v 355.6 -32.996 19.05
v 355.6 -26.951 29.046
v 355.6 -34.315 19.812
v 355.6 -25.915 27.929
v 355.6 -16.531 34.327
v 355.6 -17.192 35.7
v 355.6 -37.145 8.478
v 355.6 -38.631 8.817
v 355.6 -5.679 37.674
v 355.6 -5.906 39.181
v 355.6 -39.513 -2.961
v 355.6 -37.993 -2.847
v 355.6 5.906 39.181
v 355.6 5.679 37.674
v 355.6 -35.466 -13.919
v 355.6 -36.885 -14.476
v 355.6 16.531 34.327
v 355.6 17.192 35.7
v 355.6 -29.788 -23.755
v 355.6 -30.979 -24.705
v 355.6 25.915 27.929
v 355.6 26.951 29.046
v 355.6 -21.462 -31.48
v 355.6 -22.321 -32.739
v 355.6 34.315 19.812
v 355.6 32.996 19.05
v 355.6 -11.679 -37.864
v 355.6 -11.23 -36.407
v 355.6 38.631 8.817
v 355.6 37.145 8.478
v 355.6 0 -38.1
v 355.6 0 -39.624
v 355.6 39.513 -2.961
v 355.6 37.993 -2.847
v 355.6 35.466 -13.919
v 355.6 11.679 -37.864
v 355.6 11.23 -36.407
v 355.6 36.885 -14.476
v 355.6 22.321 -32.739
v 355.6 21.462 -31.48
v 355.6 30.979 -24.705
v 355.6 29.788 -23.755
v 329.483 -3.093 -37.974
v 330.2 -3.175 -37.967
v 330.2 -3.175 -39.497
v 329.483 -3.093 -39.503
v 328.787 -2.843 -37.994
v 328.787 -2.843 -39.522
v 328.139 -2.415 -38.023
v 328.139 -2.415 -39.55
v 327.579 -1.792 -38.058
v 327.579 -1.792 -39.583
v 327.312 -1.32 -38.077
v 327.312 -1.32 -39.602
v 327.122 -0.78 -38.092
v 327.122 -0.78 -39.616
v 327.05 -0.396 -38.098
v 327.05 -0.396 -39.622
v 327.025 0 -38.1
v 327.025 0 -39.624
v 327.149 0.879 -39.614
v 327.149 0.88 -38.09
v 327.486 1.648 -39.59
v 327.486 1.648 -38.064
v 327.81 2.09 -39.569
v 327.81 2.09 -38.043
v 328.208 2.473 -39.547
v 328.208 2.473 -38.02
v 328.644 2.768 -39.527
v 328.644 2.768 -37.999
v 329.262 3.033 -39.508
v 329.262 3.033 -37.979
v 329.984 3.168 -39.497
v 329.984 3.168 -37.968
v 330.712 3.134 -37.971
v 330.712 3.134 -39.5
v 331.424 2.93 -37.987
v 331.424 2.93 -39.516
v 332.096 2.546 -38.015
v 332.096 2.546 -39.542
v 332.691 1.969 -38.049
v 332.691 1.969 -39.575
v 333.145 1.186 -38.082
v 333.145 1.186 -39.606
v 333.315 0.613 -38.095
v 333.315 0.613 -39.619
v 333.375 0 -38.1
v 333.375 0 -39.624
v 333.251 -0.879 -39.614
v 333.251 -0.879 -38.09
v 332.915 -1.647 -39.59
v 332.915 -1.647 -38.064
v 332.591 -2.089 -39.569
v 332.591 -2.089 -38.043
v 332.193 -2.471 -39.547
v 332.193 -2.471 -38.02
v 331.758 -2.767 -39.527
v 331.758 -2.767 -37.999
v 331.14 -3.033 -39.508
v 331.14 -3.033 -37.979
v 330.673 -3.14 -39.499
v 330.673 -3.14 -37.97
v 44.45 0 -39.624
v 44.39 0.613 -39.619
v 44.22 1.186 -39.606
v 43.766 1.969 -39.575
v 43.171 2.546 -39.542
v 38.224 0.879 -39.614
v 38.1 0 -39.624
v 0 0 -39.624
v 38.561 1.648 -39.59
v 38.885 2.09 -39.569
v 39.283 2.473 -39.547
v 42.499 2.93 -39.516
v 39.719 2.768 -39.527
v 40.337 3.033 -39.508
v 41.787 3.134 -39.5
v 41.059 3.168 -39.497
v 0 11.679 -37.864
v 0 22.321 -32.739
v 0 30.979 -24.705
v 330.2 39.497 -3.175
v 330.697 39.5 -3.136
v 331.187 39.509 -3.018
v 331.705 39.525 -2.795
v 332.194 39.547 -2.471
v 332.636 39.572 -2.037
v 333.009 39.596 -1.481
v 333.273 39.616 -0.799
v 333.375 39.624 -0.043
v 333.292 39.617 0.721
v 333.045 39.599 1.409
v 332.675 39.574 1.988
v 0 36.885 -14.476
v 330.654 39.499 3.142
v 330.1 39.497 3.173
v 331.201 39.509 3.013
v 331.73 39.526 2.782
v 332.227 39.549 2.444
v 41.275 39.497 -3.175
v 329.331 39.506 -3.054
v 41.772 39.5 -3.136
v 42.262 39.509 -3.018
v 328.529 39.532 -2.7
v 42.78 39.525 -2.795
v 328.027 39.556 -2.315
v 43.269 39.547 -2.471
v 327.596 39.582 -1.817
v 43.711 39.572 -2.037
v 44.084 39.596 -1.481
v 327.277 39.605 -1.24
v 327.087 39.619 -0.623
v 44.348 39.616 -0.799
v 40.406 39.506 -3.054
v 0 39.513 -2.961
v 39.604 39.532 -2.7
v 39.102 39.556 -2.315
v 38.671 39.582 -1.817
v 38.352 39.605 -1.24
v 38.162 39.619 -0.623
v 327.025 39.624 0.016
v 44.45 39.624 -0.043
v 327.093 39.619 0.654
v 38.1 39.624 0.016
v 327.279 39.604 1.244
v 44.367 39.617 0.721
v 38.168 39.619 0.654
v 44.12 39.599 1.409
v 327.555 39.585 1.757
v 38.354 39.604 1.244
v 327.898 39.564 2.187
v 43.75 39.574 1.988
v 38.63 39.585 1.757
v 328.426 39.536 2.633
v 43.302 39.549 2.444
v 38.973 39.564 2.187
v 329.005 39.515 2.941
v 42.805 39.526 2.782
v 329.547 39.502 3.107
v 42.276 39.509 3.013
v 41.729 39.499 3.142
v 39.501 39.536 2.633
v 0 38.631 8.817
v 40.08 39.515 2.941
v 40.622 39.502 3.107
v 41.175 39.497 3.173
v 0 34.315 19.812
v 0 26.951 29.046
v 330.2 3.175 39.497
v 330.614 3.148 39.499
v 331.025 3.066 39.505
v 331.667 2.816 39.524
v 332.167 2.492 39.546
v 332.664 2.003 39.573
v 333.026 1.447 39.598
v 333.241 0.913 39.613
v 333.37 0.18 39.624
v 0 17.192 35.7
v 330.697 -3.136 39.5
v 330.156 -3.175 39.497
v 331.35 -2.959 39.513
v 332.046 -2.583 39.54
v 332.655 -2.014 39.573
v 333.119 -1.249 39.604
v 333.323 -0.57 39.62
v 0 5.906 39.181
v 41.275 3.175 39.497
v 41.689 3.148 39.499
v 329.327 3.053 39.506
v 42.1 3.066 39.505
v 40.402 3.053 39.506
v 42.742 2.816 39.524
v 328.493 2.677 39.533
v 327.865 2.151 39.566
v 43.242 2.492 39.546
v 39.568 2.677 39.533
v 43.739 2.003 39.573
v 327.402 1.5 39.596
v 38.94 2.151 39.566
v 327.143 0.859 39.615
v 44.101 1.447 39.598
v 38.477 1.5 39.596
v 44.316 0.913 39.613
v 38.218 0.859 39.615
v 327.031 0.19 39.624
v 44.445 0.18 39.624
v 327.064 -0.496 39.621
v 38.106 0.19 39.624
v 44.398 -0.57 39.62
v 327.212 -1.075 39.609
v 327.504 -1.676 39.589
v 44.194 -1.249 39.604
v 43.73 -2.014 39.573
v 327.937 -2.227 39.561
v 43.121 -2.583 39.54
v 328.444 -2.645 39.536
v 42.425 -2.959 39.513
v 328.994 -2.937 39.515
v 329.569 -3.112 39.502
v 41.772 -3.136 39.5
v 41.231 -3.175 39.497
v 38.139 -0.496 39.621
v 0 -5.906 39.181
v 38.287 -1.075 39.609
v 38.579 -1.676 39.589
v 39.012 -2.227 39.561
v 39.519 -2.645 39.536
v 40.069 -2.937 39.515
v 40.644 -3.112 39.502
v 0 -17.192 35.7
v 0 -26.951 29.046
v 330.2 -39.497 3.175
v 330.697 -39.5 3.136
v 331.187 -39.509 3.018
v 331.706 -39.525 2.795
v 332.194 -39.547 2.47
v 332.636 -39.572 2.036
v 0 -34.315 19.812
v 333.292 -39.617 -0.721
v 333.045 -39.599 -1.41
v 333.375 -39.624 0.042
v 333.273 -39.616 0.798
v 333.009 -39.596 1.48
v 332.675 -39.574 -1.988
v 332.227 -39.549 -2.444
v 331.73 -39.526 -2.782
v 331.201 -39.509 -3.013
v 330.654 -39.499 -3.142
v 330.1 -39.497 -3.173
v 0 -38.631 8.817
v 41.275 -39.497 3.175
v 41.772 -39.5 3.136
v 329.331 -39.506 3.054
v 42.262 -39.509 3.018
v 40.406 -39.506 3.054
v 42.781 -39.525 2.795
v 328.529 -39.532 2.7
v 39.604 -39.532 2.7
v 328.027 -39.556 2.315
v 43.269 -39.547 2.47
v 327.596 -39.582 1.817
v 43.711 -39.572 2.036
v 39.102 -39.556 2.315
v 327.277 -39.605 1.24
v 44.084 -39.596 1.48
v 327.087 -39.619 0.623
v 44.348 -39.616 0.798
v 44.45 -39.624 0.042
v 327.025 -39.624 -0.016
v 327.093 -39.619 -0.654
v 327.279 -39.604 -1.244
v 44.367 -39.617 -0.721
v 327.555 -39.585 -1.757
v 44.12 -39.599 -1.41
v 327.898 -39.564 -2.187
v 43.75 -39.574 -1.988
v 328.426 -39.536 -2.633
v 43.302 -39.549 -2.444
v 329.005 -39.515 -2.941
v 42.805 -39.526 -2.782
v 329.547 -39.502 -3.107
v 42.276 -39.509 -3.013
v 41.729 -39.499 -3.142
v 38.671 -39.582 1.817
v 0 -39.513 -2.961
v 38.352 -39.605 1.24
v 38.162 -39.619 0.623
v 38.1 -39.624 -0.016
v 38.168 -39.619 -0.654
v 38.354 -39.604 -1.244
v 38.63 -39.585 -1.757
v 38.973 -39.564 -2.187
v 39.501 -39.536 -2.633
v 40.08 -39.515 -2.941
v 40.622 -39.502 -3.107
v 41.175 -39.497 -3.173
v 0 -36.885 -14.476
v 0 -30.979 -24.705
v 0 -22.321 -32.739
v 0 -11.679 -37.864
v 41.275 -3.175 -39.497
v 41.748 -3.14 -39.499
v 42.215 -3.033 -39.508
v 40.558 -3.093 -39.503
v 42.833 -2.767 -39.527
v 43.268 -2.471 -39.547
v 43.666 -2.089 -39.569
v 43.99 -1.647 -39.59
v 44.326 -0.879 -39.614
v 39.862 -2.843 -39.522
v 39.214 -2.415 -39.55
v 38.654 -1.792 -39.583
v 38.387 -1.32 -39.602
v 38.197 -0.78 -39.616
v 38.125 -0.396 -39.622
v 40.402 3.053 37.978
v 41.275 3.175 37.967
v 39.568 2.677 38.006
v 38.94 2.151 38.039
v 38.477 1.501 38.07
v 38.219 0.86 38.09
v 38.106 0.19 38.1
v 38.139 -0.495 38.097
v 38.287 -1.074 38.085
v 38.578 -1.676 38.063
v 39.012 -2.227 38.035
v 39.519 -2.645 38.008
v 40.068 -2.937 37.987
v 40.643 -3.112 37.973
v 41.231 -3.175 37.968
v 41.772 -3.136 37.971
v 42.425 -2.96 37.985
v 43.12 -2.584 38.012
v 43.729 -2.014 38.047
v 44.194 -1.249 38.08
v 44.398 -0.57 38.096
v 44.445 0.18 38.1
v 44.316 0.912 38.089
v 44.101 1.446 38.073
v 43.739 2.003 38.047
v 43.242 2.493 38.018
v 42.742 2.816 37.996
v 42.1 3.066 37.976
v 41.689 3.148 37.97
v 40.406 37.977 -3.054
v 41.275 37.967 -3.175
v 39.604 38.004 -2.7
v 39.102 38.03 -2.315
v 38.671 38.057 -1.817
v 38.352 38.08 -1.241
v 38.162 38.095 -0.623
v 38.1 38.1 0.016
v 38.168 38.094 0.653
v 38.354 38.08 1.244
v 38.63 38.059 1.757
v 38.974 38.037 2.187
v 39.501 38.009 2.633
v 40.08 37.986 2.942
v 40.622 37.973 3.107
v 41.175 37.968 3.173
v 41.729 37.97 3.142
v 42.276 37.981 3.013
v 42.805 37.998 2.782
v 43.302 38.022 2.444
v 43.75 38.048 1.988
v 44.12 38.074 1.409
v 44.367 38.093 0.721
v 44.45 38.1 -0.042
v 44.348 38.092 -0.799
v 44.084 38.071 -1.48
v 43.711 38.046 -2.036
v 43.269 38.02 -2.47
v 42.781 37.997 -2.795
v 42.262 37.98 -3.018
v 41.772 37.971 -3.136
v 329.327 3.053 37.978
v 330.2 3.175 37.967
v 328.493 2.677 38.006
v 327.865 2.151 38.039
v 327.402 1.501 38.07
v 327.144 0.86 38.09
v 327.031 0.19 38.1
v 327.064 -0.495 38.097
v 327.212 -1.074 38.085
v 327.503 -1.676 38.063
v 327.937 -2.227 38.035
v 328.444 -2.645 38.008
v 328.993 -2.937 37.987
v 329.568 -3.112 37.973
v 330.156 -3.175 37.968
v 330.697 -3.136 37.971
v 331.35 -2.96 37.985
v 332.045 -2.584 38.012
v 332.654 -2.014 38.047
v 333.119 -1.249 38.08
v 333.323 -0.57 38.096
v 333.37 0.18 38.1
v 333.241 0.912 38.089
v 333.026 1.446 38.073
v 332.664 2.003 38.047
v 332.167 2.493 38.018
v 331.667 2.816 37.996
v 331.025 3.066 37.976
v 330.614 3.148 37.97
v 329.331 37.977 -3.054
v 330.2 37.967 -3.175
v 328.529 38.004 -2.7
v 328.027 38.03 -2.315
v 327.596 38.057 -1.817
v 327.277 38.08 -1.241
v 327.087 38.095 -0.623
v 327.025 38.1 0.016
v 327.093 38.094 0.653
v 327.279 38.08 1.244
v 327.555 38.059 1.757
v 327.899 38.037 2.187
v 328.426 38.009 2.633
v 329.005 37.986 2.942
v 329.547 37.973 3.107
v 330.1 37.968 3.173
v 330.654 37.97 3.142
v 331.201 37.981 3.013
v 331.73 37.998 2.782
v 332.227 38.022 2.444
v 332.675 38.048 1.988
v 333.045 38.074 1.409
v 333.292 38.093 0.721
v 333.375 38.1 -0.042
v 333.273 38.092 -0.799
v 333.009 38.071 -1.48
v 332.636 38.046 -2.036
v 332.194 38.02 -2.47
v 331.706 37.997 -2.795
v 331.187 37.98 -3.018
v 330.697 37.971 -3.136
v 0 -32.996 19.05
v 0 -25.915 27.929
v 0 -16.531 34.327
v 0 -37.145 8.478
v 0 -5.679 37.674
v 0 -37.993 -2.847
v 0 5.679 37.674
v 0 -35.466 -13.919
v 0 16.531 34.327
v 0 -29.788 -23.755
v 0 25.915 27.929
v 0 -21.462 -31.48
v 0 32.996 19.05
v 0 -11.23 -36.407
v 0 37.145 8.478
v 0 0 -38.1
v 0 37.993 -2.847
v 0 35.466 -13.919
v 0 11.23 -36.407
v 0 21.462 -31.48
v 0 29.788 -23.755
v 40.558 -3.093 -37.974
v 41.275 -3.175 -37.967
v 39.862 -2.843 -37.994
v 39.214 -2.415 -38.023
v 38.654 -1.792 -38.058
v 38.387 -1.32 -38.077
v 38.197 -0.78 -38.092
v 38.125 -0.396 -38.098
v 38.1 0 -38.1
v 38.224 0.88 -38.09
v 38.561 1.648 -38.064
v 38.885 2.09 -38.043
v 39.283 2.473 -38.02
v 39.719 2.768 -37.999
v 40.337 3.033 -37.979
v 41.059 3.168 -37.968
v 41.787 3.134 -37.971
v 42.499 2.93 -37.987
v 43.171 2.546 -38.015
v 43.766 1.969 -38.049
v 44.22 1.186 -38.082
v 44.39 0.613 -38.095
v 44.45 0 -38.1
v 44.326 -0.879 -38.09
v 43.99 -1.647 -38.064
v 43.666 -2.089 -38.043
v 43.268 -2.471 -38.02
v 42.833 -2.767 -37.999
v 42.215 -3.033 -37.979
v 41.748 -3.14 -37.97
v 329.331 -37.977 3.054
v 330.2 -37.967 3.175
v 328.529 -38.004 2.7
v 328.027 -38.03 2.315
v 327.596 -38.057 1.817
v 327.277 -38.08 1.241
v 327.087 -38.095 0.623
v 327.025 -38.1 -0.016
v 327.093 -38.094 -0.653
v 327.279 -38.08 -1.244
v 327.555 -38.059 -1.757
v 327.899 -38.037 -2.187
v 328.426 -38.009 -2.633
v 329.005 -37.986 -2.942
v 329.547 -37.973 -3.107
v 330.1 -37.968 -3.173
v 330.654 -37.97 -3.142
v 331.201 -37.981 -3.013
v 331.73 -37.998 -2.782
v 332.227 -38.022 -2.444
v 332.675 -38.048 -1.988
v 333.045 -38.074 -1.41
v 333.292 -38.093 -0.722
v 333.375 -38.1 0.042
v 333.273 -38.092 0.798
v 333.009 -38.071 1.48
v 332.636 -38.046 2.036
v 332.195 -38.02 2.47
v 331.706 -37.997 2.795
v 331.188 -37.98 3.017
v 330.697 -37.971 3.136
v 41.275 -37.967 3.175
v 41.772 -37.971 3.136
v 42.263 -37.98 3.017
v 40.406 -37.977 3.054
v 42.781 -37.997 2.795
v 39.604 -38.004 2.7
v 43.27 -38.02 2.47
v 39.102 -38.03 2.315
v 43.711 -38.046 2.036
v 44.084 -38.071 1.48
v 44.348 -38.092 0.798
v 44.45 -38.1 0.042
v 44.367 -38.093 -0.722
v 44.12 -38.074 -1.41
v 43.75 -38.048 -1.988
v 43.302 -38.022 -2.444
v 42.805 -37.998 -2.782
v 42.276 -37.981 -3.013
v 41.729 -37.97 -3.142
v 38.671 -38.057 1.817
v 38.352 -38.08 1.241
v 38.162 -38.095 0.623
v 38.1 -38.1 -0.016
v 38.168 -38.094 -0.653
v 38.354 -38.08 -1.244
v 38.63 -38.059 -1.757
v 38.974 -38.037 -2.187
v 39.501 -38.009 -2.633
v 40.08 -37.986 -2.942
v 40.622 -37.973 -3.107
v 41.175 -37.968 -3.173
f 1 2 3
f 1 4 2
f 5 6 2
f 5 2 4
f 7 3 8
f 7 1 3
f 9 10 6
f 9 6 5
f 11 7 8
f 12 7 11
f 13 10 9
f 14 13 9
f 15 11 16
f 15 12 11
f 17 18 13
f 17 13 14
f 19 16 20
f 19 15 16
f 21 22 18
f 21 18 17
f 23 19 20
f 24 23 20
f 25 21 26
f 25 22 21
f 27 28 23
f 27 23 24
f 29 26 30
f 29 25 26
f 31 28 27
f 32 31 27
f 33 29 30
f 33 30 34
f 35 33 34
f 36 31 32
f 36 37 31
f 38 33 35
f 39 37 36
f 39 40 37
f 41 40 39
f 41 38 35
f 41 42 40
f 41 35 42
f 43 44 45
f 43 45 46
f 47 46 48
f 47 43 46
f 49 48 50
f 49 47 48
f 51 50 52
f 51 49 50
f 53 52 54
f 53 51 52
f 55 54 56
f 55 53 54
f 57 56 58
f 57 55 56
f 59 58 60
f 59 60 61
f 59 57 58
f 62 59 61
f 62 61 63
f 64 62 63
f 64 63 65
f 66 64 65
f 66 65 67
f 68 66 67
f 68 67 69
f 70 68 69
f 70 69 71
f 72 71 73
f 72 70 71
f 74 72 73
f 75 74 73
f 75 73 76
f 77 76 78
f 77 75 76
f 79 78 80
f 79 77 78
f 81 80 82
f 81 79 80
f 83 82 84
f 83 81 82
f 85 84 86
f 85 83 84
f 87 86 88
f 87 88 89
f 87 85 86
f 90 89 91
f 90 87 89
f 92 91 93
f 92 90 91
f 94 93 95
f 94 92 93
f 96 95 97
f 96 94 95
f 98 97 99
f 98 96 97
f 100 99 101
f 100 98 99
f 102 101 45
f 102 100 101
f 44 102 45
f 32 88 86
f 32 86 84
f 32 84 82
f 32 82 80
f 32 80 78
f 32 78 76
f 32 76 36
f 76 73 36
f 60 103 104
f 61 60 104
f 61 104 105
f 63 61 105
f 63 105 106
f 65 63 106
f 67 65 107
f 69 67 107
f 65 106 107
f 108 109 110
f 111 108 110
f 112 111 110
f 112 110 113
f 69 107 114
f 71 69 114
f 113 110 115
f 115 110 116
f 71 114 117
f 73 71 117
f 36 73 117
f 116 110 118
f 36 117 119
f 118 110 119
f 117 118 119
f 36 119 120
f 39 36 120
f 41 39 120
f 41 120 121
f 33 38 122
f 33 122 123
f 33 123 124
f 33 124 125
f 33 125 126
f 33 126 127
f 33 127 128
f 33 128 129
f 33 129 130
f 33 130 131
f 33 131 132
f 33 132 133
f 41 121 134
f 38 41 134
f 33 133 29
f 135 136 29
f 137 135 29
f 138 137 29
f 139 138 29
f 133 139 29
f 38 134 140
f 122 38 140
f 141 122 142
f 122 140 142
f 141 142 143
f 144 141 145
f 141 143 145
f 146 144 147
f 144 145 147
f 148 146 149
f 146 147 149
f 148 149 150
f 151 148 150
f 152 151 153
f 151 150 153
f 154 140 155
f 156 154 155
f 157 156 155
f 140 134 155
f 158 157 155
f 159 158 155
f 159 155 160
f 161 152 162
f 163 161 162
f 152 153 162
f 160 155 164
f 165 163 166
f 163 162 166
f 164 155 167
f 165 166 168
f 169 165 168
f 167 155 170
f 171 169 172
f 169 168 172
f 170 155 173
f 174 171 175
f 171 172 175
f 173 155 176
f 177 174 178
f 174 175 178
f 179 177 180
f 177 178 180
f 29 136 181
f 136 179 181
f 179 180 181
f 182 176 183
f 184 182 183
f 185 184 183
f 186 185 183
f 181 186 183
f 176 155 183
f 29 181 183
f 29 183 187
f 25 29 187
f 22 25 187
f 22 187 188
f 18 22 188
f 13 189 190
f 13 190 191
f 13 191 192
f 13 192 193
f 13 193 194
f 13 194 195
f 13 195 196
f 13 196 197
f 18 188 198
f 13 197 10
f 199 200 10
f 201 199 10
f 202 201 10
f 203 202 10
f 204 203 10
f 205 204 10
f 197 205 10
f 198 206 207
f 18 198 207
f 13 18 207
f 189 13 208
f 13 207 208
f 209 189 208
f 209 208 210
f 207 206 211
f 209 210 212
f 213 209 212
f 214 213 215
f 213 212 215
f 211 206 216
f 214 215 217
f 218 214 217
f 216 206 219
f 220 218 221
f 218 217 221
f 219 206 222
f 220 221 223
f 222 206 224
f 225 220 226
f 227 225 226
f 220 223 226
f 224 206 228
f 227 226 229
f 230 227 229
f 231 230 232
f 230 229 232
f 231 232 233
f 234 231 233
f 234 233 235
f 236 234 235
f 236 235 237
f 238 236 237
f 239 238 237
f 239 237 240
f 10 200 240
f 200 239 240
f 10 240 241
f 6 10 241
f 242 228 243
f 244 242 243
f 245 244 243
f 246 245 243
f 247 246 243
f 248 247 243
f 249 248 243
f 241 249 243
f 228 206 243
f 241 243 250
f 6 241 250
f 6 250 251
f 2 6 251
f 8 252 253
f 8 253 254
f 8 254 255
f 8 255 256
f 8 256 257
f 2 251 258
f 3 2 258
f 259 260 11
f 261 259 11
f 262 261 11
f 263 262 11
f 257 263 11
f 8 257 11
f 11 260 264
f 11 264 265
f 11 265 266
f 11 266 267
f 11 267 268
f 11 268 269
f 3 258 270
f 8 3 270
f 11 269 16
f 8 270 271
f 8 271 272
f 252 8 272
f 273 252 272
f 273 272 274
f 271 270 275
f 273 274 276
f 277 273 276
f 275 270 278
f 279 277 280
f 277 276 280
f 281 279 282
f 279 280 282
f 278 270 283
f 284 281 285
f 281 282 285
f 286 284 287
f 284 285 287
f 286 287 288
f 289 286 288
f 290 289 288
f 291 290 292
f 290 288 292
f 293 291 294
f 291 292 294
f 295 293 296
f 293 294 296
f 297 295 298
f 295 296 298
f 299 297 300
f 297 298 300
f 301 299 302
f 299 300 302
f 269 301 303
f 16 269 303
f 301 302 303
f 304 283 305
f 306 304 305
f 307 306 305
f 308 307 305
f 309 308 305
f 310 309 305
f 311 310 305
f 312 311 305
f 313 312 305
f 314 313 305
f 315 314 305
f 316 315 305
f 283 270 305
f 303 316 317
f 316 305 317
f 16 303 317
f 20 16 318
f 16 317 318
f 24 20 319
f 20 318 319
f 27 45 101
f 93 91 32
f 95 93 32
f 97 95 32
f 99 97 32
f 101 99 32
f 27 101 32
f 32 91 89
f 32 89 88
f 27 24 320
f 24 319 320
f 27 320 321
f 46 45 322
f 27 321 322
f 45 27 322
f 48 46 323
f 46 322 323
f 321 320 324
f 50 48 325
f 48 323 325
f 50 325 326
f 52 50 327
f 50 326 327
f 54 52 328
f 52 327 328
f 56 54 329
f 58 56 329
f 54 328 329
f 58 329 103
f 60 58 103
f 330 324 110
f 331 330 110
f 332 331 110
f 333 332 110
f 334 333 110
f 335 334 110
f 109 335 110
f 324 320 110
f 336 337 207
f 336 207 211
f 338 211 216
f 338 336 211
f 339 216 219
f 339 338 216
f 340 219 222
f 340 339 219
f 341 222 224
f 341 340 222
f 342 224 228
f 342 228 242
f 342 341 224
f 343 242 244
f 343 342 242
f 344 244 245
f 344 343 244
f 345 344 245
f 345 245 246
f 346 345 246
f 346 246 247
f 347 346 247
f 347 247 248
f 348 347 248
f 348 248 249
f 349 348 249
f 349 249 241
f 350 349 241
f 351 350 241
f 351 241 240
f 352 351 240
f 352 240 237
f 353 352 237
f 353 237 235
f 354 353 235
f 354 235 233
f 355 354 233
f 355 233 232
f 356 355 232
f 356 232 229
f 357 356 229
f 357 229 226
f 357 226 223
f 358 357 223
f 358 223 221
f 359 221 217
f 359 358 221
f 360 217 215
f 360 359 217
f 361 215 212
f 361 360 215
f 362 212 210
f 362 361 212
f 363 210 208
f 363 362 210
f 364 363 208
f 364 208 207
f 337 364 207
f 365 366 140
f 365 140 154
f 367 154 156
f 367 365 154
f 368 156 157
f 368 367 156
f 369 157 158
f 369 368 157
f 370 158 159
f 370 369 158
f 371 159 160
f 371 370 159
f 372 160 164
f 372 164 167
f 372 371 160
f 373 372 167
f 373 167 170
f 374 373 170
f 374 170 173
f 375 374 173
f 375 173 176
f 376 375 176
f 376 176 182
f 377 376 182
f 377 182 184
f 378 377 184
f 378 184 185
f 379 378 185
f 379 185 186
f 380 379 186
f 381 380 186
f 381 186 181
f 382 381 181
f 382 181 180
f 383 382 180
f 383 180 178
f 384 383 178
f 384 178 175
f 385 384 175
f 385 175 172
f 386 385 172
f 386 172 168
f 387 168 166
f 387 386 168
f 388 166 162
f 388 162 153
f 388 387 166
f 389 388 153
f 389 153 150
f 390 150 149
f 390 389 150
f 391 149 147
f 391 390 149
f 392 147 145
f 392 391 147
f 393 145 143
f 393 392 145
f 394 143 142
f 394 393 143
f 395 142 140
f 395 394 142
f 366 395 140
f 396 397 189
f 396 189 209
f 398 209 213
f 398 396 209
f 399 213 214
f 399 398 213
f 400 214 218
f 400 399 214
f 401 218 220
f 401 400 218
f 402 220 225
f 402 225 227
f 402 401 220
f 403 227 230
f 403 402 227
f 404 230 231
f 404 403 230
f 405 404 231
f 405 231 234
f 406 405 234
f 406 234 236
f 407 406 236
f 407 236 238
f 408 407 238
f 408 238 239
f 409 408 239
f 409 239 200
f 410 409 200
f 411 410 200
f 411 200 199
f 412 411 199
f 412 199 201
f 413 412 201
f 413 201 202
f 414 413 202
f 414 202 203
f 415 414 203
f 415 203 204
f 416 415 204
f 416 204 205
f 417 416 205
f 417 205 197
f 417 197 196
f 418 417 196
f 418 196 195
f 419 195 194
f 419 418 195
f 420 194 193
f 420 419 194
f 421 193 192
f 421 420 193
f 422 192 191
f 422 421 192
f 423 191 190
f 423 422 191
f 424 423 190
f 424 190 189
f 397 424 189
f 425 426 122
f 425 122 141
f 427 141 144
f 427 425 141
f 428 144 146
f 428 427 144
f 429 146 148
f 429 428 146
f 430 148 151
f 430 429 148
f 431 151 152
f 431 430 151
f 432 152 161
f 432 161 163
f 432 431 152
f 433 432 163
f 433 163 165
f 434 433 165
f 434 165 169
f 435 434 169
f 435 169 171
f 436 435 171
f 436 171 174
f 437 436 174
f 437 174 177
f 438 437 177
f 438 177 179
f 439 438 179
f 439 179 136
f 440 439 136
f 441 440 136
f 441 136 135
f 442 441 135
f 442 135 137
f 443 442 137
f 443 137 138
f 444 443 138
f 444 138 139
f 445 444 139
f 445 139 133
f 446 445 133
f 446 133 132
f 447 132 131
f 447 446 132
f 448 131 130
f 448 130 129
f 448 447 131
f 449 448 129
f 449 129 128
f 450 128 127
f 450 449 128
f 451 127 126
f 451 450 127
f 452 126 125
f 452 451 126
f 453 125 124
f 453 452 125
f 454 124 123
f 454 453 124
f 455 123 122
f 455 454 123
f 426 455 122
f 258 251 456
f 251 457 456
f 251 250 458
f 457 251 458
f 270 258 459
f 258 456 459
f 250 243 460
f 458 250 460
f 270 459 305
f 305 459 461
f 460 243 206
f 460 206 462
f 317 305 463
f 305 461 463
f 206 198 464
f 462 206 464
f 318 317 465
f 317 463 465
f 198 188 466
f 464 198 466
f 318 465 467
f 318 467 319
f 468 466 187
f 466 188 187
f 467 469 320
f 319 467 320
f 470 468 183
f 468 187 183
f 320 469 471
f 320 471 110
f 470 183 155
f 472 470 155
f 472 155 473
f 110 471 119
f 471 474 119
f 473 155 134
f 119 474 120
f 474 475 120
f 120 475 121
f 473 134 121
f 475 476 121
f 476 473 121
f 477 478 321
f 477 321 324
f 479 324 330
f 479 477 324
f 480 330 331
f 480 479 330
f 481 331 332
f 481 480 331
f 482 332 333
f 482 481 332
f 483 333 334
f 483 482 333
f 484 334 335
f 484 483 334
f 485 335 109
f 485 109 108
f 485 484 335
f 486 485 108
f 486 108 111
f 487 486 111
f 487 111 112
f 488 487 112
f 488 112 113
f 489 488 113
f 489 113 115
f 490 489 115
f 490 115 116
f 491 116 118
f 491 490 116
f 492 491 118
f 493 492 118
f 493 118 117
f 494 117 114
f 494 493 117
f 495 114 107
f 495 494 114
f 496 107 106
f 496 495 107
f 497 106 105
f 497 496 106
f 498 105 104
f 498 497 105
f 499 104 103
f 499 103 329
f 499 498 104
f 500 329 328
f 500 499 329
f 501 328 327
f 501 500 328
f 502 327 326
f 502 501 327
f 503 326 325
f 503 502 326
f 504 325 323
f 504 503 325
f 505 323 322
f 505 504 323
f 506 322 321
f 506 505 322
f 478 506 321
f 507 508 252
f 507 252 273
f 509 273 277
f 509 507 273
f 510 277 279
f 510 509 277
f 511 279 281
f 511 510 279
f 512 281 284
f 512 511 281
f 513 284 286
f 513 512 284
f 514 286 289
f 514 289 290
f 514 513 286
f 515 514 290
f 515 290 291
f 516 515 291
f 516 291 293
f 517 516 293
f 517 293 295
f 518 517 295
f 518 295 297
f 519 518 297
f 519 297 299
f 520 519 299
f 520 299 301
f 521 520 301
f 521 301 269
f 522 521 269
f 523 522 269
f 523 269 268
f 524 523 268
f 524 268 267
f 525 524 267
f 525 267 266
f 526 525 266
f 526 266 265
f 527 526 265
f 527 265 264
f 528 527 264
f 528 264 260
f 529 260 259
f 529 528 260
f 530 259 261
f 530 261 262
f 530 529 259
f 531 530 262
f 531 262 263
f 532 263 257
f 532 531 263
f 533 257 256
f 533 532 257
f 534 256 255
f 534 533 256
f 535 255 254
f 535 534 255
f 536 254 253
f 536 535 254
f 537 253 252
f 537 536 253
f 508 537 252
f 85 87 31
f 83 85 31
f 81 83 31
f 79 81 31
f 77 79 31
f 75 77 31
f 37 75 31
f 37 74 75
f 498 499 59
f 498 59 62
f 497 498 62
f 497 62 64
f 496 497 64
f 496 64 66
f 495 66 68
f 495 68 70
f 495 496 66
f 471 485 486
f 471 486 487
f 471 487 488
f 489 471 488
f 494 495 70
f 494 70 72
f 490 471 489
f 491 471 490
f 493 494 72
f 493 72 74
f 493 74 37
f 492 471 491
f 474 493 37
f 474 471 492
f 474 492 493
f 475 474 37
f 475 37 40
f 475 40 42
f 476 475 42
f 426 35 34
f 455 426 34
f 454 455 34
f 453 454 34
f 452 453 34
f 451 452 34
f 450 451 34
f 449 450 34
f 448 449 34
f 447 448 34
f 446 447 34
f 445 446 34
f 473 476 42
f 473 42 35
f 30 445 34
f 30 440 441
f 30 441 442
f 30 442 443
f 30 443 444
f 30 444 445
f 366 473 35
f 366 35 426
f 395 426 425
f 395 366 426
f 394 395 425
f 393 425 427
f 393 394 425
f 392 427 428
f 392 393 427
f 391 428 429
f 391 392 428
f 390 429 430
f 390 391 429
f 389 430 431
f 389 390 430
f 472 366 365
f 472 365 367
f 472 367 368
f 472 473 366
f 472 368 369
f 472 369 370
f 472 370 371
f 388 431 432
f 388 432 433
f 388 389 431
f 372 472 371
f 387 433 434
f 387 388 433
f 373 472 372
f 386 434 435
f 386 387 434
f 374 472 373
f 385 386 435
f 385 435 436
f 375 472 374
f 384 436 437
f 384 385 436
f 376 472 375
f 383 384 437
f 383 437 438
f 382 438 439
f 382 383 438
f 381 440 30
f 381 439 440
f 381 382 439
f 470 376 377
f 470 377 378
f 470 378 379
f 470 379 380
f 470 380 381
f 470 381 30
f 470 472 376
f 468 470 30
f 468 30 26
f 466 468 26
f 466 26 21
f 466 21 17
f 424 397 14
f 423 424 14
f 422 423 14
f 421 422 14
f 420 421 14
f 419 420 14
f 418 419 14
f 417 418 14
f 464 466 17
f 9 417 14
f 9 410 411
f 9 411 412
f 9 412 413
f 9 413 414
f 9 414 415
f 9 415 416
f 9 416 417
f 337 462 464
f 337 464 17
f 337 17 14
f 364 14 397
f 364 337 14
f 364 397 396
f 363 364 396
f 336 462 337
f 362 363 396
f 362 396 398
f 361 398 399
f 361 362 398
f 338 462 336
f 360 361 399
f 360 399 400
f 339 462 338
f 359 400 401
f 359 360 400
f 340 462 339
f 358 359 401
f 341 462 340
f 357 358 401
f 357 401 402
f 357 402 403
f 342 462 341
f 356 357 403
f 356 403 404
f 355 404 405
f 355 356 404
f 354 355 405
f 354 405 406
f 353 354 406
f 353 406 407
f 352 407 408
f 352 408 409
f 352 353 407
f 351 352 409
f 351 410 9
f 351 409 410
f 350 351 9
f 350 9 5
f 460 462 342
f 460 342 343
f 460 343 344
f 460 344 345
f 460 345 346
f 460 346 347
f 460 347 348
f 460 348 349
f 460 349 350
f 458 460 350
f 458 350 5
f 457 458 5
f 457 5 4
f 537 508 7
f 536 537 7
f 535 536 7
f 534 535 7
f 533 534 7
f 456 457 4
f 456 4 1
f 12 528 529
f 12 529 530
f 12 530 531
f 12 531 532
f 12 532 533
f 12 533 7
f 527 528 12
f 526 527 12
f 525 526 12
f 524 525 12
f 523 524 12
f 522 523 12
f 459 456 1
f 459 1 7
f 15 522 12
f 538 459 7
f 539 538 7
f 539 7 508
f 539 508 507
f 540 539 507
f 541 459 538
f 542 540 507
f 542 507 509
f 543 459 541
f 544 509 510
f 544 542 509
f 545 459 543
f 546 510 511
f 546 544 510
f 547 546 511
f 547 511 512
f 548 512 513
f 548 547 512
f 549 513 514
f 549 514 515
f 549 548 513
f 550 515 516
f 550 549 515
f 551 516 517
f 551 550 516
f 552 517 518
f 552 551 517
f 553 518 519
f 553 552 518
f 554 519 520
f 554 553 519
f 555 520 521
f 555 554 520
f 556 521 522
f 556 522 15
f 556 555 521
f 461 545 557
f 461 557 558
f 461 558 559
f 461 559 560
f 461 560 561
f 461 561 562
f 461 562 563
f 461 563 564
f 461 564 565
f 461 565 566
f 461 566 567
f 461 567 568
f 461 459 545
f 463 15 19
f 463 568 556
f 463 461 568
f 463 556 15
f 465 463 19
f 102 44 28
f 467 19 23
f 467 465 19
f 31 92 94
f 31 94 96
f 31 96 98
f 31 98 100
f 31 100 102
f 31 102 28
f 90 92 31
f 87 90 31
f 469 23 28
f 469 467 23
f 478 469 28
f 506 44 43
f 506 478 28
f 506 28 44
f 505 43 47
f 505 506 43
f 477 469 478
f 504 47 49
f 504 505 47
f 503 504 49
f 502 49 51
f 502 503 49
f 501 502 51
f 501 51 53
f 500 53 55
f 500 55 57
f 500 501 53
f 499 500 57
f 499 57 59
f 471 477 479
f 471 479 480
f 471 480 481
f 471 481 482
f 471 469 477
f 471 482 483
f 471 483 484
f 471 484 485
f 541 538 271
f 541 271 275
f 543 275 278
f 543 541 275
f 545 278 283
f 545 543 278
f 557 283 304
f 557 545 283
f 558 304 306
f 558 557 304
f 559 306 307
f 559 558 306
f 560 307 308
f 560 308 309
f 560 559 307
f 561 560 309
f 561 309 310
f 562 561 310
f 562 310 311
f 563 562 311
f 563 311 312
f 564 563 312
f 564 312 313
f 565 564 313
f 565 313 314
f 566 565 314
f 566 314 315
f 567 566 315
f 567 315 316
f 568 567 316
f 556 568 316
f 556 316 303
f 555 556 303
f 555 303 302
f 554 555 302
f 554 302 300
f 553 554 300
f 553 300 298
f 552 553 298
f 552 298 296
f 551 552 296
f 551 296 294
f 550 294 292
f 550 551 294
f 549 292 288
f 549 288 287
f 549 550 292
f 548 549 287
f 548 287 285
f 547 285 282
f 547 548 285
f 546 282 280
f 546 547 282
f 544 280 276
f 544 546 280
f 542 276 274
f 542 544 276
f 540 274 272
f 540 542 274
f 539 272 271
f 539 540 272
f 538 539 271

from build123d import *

# Parameters (mm, degrees)
SKETCH1_R           = 39.624
SKETCH1_R_2         = 38.1
BOSS_EXTRUDE1_DEPTH = 355.6
SKETCH2_R           = 3.175
CUT_EXTRUDE1_DEPTH  = 360.988170295
CIRPATTERN1_COUNT   = 4
SKETCH3_R           = 3.175
CUT_EXTRUDE2_DEPTH  = 360.988170415
CIRPATTERN2_COUNT   = 4


with BuildPart() as part:
    # Sketch1 → Boss-Extrude1 (new body)
    with BuildSketch(Plane.YZ):
        with Locations(Location((0, 0, 0), (0, 0, 270))):
            Circle(SKETCH1_R)
        with Locations(Location((0, 0, 0), (0, 0, 270))):
            Circle(SKETCH1_R_2, mode=Mode.SUBTRACT)
    extrude(amount=BOSS_EXTRUDE1_DEPTH)

    # Sketch2 → Cut-Extrude1 (cut, through all)
    with BuildSketch(Plane(origin=(0, 0, 0), x_dir=(-1, 0, 0), z_dir=(0, 1, 0))):
        with Locations(Location((-330.2, 0, 0), (0, 0, 270))):
            Circle(SKETCH2_R)
    cut_extrude1 = extrude(amount=CUT_EXTRUDE1_DEPTH, mode=Mode.SUBTRACT)

    # CirPattern1: Cut-Extrude1 ×4 about axis
    cirpattern1_axis = Axis((355.6, 0, 0), (-1, 0, 0))
    for i in range(1, CIRPATTERN1_COUNT):
        add(cut_extrude1.rotate(cirpattern1_axis, i * 360 / CIRPATTERN1_COUNT), mode=Mode.SUBTRACT)

    # Sketch3 → Cut-Extrude2 (cut, through all)
    with BuildSketch(Plane(origin=(0, 0, 0), x_dir=(-1, 0, 0), z_dir=(0, 1, 0))):
        with Locations(Location((-41.275, 0, 0), (0, 0, 270))):
            Circle(SKETCH3_R)
    cut_extrude2 = extrude(amount=CUT_EXTRUDE2_DEPTH, mode=Mode.SUBTRACT)

    # CirPattern2: Cut-Extrude2 ×4 about axis
    cirpattern2_axis = Axis((355.6, 0, 0), (-1, 0, 0))
    for i in range(1, CIRPATTERN2_COUNT):
        add(cut_extrude2.rotate(cirpattern2_axis, i * 360 / CIRPATTERN2_COUNT), mode=Mode.SUBTRACT)


solid = part.part
